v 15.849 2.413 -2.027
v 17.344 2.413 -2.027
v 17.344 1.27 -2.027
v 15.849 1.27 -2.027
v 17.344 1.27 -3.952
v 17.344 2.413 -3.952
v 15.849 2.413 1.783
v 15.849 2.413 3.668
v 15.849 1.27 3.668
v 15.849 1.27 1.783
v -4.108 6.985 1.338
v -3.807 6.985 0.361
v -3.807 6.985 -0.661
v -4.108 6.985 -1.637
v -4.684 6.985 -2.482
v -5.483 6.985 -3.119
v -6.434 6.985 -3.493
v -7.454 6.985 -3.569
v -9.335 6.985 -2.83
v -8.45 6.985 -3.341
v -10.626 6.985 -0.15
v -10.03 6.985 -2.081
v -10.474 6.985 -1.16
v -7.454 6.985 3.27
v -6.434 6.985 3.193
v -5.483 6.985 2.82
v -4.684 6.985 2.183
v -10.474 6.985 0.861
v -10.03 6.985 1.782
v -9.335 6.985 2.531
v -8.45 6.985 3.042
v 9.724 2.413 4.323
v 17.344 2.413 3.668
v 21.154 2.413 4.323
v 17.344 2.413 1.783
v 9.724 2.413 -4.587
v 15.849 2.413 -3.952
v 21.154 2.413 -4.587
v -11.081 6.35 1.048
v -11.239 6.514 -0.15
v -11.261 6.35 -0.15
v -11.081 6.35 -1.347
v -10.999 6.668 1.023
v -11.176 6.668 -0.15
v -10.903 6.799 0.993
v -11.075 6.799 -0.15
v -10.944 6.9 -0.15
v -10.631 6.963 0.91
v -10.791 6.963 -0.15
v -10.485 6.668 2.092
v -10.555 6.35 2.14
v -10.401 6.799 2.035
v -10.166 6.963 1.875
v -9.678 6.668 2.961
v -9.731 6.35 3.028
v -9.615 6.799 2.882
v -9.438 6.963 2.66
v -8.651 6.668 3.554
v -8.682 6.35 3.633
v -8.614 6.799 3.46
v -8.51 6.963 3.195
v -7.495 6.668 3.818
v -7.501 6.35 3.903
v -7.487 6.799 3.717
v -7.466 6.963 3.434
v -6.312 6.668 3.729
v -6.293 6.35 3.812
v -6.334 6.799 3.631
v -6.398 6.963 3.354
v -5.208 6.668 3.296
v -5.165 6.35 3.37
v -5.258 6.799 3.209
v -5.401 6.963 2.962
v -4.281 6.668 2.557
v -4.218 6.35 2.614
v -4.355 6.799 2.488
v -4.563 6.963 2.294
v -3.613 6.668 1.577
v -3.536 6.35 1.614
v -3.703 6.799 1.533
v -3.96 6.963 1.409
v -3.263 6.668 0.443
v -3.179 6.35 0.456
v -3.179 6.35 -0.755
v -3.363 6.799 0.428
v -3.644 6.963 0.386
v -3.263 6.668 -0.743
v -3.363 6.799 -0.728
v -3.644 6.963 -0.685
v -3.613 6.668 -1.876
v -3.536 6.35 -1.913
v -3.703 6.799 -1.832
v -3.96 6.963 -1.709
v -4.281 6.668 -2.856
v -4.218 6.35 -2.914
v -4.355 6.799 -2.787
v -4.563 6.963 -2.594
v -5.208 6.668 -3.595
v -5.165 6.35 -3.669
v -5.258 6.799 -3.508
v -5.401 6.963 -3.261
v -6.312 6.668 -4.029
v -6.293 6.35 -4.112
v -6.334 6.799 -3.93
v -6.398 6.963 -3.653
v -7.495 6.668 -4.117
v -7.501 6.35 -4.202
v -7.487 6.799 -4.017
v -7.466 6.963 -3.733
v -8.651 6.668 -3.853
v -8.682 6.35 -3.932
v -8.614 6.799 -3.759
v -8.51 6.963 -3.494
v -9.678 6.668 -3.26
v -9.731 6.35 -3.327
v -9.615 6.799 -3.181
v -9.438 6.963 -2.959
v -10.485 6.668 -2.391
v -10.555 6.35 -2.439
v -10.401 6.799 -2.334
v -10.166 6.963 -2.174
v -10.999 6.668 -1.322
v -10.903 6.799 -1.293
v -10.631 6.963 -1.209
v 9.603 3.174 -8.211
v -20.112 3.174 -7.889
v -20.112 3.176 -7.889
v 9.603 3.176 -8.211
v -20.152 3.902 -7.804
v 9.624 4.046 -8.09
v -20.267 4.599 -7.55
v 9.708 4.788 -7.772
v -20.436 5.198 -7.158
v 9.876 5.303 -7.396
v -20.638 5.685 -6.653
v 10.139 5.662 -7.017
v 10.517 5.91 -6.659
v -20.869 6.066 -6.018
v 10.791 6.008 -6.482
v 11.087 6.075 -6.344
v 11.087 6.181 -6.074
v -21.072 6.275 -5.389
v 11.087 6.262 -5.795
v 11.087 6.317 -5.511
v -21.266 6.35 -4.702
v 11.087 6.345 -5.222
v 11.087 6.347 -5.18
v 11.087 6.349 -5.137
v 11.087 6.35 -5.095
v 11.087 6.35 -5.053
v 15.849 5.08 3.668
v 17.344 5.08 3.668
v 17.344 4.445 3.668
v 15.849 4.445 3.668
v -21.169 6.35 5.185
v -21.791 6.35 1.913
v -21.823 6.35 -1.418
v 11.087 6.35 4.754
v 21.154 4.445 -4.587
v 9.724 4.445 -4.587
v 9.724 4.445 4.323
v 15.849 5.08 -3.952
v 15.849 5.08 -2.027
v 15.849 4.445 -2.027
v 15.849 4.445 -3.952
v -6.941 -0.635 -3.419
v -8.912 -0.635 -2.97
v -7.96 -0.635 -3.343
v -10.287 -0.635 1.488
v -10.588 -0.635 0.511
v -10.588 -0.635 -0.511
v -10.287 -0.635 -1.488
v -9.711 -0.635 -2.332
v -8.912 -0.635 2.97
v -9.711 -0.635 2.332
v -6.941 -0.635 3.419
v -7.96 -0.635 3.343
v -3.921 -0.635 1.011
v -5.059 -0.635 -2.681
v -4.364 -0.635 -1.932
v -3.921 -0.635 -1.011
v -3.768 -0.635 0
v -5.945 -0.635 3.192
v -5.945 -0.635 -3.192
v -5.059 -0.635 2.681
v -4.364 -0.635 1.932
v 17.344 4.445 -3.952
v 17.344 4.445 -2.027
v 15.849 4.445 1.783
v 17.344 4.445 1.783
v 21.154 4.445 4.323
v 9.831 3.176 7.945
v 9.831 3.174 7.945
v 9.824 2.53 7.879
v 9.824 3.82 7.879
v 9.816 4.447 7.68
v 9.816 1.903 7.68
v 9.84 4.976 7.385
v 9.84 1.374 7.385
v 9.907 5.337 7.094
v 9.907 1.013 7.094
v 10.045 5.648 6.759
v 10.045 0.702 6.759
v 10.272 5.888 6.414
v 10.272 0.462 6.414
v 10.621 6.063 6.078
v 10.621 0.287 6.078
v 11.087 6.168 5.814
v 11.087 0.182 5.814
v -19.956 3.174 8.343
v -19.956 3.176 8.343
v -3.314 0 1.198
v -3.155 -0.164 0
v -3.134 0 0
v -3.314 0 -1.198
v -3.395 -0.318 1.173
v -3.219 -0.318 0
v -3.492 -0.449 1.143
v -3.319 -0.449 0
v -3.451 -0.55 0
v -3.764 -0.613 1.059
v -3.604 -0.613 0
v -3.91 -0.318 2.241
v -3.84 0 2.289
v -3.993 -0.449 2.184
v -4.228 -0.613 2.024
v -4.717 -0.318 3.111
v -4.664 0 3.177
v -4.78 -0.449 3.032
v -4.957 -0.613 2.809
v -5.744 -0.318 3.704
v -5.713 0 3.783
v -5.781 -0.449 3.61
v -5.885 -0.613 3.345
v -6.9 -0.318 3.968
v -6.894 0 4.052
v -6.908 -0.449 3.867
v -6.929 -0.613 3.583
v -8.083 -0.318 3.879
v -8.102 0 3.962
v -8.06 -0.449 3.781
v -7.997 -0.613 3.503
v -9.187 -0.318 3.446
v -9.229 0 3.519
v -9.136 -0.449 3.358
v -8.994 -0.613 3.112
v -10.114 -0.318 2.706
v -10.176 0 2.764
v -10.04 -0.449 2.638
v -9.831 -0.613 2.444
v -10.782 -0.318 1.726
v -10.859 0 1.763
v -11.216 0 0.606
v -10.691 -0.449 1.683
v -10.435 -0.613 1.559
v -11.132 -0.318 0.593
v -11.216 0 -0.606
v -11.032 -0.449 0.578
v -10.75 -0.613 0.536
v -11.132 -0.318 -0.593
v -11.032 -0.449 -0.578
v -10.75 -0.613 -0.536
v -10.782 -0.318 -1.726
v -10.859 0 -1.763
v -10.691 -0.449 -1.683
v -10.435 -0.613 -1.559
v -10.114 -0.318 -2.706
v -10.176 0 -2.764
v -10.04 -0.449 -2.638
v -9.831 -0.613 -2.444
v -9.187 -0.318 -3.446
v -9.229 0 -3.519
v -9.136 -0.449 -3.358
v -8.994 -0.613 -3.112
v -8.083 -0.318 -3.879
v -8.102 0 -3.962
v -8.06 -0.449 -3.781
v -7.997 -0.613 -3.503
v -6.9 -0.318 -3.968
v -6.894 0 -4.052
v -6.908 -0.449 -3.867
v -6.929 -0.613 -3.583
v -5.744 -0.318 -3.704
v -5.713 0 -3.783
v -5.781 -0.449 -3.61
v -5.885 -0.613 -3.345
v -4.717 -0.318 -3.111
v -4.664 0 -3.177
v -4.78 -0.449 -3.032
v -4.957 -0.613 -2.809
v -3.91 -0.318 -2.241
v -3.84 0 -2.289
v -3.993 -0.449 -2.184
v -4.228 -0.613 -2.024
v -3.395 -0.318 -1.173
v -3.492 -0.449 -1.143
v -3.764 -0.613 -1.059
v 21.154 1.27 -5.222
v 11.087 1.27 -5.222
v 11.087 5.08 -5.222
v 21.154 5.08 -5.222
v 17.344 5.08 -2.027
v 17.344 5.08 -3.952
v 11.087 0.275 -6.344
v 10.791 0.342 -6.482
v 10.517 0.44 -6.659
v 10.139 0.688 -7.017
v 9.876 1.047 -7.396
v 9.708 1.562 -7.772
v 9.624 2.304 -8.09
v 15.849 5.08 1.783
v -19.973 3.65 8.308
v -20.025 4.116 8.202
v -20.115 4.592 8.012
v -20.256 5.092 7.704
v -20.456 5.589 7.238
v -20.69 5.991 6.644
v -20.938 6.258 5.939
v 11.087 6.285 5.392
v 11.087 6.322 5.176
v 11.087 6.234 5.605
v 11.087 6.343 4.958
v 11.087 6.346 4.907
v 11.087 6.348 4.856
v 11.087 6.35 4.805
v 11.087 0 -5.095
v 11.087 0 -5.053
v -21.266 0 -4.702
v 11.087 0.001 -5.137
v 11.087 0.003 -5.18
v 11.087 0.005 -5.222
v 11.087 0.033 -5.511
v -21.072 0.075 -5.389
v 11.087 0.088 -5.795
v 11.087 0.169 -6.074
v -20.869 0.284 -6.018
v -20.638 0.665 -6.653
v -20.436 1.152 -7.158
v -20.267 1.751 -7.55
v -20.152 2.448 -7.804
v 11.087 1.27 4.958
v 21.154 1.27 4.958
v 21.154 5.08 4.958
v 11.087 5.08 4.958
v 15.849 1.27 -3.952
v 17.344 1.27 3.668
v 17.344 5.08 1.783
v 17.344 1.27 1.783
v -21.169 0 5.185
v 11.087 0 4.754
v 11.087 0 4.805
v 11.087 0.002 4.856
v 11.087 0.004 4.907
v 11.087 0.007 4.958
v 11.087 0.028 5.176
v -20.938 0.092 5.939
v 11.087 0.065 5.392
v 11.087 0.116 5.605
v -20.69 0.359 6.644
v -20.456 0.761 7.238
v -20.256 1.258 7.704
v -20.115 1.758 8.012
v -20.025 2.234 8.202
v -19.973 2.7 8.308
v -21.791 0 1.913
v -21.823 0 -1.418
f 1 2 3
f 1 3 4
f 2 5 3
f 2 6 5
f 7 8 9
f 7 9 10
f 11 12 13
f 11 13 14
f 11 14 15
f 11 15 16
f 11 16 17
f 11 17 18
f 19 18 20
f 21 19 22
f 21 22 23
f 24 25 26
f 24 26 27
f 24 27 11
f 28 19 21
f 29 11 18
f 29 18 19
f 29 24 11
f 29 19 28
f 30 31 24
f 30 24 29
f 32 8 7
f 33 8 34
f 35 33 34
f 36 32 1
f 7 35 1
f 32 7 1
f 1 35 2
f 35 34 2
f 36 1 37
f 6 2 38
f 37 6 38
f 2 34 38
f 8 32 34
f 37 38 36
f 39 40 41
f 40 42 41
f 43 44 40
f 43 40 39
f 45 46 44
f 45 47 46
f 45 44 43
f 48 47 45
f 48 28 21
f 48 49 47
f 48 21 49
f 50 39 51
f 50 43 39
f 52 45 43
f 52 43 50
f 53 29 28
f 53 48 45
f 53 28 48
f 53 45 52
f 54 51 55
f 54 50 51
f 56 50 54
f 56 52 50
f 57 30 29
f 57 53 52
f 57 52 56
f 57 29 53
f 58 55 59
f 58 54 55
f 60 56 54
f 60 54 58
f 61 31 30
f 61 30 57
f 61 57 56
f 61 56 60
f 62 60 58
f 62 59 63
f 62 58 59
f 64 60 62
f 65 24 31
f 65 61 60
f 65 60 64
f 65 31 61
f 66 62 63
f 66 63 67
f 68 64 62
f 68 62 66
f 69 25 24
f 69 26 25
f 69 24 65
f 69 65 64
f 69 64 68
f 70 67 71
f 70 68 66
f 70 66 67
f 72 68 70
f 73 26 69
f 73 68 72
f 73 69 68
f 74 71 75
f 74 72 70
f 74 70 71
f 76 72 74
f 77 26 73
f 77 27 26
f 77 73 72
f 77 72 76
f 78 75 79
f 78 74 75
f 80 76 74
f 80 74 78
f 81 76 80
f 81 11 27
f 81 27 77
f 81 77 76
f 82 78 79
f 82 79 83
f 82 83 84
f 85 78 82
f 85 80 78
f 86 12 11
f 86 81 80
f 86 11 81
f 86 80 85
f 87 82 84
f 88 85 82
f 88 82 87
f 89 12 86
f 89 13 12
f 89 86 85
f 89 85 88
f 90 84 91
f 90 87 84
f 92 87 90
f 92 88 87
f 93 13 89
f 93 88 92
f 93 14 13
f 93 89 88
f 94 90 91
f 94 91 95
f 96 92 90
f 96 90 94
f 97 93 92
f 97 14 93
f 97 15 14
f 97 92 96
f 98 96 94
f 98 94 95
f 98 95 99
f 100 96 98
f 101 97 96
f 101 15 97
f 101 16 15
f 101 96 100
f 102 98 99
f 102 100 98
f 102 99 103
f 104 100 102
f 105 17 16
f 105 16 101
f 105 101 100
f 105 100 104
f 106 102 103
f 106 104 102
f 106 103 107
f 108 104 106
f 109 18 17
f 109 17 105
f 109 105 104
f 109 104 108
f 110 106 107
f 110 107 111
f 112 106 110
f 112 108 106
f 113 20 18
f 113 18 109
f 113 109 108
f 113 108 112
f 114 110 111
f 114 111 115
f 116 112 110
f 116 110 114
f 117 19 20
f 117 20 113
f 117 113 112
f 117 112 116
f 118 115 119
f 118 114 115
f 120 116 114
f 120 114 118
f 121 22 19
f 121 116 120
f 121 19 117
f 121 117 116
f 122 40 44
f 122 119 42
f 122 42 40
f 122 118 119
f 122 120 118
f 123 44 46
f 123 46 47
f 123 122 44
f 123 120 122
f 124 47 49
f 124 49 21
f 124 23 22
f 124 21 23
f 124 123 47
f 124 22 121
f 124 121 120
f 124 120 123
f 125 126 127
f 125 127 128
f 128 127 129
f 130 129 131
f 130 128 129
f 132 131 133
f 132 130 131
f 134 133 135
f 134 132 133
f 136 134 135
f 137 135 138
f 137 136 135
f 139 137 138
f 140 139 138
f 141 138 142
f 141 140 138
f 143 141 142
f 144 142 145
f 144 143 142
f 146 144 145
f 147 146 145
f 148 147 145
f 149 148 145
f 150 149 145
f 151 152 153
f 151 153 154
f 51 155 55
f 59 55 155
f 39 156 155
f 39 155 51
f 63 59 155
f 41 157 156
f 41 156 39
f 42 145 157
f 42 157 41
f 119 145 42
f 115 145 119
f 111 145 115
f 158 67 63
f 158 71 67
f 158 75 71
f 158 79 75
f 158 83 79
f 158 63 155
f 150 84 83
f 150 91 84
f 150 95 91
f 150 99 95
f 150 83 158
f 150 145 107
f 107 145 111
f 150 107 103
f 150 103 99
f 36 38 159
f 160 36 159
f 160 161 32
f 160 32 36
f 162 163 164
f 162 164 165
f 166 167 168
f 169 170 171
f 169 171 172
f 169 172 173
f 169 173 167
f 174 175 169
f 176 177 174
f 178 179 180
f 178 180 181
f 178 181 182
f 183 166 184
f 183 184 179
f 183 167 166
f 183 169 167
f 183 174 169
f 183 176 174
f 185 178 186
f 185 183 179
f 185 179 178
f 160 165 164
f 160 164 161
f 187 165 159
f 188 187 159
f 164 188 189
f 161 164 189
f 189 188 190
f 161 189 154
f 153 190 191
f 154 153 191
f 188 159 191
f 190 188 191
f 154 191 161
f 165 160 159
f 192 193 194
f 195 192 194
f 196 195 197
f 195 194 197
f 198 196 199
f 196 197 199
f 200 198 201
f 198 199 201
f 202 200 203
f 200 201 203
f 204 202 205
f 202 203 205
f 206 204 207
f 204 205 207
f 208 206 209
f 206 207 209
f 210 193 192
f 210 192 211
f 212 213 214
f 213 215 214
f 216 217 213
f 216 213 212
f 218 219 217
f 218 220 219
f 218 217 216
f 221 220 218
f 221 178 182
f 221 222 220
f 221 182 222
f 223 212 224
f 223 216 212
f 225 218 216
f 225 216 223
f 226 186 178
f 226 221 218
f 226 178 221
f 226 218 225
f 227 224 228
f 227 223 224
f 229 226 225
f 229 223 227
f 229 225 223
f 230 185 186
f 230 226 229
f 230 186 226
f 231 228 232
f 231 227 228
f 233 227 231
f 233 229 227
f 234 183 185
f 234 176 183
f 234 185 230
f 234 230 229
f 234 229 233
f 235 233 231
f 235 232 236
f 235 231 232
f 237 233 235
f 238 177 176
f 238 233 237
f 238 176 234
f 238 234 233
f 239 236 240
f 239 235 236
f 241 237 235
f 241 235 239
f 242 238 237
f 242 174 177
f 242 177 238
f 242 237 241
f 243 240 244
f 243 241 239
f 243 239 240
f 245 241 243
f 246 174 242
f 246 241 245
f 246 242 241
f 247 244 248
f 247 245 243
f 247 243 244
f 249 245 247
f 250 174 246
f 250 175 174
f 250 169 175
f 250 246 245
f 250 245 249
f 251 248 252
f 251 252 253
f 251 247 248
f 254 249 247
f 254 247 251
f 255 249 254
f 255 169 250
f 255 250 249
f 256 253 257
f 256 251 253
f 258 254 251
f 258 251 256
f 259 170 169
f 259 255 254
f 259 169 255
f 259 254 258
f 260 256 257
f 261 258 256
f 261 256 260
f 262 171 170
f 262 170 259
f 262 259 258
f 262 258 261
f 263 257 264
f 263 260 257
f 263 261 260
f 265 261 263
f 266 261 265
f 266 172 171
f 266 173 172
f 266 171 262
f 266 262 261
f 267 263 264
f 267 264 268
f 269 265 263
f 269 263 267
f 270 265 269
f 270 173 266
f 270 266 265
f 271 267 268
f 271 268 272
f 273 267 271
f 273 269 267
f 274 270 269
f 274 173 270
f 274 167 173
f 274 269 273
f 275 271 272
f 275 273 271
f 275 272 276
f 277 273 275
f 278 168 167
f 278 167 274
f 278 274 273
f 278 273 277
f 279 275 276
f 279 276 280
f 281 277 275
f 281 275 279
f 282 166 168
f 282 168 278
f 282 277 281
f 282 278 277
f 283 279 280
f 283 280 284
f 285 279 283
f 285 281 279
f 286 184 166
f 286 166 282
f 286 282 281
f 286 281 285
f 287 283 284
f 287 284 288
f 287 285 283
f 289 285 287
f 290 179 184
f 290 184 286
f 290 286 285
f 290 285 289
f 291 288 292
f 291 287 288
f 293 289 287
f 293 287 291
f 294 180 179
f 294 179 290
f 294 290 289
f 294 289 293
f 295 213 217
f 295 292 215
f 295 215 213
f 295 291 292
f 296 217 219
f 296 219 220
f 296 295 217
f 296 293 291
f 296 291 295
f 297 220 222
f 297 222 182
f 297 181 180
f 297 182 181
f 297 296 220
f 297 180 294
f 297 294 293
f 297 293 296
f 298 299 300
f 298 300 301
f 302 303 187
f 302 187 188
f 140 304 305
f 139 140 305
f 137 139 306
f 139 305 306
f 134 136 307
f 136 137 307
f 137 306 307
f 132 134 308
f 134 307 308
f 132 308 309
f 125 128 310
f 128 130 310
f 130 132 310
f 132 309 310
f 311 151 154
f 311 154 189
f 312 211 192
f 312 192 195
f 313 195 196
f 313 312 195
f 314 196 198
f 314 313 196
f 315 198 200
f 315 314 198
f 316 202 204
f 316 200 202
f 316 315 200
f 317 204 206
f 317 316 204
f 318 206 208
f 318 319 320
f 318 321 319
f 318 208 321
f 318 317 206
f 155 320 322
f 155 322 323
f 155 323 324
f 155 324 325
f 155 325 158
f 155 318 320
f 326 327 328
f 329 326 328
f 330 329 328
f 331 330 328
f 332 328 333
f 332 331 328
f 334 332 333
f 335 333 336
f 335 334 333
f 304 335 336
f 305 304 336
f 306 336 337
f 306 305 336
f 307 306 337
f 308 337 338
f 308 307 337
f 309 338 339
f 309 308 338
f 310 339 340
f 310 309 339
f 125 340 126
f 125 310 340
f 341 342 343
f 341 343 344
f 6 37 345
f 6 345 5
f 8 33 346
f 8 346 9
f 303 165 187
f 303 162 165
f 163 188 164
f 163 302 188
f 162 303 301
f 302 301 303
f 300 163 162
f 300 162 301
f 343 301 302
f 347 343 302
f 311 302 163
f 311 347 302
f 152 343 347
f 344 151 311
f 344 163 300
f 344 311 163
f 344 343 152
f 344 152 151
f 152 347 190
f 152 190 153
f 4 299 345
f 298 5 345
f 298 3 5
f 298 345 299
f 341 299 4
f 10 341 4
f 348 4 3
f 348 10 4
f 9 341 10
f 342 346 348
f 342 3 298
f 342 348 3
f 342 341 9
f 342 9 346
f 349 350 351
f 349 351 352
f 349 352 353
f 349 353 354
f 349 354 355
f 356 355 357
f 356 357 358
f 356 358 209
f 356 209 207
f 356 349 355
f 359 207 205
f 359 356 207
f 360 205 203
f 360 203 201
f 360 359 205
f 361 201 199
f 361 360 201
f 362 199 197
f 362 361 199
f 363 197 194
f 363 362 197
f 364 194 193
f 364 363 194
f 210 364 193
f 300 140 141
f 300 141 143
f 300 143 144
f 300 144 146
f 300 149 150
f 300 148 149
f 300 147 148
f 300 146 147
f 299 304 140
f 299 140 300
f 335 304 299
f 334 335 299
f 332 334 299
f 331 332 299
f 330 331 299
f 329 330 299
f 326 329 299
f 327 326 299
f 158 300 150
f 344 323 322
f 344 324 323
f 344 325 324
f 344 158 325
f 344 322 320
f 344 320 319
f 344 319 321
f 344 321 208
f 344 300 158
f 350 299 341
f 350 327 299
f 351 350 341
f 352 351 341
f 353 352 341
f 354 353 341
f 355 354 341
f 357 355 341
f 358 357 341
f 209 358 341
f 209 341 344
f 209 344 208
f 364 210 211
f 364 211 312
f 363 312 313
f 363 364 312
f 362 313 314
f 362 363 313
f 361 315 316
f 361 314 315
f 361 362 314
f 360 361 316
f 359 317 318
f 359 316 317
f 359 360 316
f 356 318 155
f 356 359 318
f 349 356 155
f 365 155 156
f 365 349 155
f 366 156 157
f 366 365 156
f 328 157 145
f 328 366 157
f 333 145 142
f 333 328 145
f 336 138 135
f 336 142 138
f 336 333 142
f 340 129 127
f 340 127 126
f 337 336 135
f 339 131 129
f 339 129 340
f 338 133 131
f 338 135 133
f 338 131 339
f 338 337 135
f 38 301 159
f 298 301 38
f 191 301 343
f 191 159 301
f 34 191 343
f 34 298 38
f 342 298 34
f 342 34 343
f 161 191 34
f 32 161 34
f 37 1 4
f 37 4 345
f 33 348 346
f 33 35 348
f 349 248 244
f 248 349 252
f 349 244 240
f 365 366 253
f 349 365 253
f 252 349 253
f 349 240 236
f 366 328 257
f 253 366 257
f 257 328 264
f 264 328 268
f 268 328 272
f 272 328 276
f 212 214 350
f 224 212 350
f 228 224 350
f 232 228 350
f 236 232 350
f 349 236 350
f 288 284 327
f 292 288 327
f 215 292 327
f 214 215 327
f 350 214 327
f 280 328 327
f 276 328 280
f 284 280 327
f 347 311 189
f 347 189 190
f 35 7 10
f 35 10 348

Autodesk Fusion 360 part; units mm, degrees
sketch "MASTER SKETCH" plane through (0, 0, 0) normal (0, 1, 0) x (1, 0, 0)
  line L0 (-20.1125, 7.8888) -> (9.6034, 8.2112)
  arc A0 (9.6034, 8.2112) -> (11.0867, 6.3443) centre (11.9278, 8.5352) ccw
  line L1 (11.0867, 6.3443) -> (11.0867, 5.2219)
  line L2 (11.0867, 5.2219) -> (21.1539, 5.2219)
  line L3 (21.1539, 5.2219) -> (21.1539, -4.9577)
  line L4 (21.1539, -4.9577) -> (11.0867, -4.9577)
  line L5 (11.0867, -4.9577) -> (11.0867, -5.8142)
  arc A1 (11.0867, -5.8142) -> (9.8311, -7.945) centre (11.8441, -7.6959) ccw
  line L6 (9.8311, -7.945) -> (-19.9558, -8.3433)
  arc A2 (-20.1125, 7.8888) -> (-19.9558, -8.3433) centre (-3.1266, -0.064) ccw
  line L7 (15.1779, 3.7868) -> (16.7624, 3.7868)
  line L8 (16.7624, 3.7868) -> (16.7624, 1.8338)
  line L9 (16.7624, 1.8338) -> (15.1779, 1.8338)
  line L10 (15.1779, 1.8338) -> (15.1779, 3.7868)
  line L11 (15.1779, -1.2246) -> (16.7624, -1.2246)
  line L12 (16.7624, -1.2246) -> (16.7624, -3.2144)
  line L13 (16.7624, -3.2144) -> (15.1779, -3.2144)
  line L14 (15.1779, -3.2144) -> (15.1779, -1.2246)
  circle A3 centre (-7.2793, 0.4193) radius 4.0763
extrude "Extrude1" add sketch "MASTER SKETCH" along normal blind 6.35 contours L0 A0 L1 L2 L3 L4 L5 A1 L6 A2 | L7 L8 L9 L10 | L11 L12 L13 L14 | A3 in component "BODY"
fillet "Fillet1" radius 3.175 4 edges at (-5.0623, 6.35, 8.1442) (-5.2545, 6.35, -8.05) (-5.0623, 0, 8.1442) (-5.2545, 0, -8.05) in component "BODY"
sketch "Sketch1" plane through (0, 6.35, 0) normal (0, 1, 0) x (-1, 0, 0) in component "BODY"
  line L0 (-21.1539, -5.1613) -> (21.2666, -4.7011)
  arc A0 (21.2666, -4.7011) -> (21.1696, 5.1842) centre (3.1266, 0.064) ccw
  line L1 (21.1696, 5.1842) -> (-21.1539, 4.6184)
  line L2 (-21.1539, 4.6184) -> (-21.1539, -5.1613)
  line L3 (-11.0867, -6.3443) -> (-11.0867, 5.8142)
  line L4 (-11.0867, 5.8142) -> (-21.1539, 5.8142)
  line L5 (-21.1539, 5.8142) -> (-21.1539, -6.3443)
  line L6 (-21.1539, -6.3443) -> (-11.0867, -6.3443)
extrude "Extrude2" cut sketch "Sketch1" against normal blind 1.27 contours L0 L1 L2 L3 L5 | L0 L3 L5 L6 | L1 L3 L4 L5 in component "BODY"
sketch "Sketch2" plane through (0, 0, 0) normal (0, -1, 0) x (1, 0, 0) in component "BODY"
  line L0 (-21.2666, -4.7011) -> (21.1539, -5.1613)
  line L1 (21.1539, -5.1613) -> (21.1539, 4.6184)
  line L2 (21.1539, 4.6184) -> (-21.1696, 5.1842)
  arc A0 (-21.1696, 5.1842) -> (-21.2666, -4.7011) centre (-3.1266, 0.064) ccw
  line L3 (11.0867, 5.8142) -> (11.0867, -6.3443)
  line L4 (11.0867, -6.3443) -> (21.1539, -6.3443)
  line L5 (21.1539, -6.3443) -> (21.1539, 5.8142)
  line L6 (21.1539, 5.8142) -> (11.0867, 5.8142)
extrude "Extrude3" cut sketch "Sketch2" against normal blind 1.27 contours L0 L1 L2 L3 L5 | L0 L3 L4 L5 | L2 L3 L5 L6 in component "BODY"
sketch "Sketch3" plane through (0, 5.08, 0) normal (0, 1, 0) x (-1, 0, 0) in component "BODY"
  line L0 (-21.1539, -5.2219) -> (-11.0867, -5.2219)
  line L1 (-11.0867, -5.2219) -> (-11.0867, 4.9577)
  line L2 (-11.0867, 4.9577) -> (-21.1539, 4.9577)
  line L3 (-21.1539, 4.9577) -> (-21.1539, -5.2219)
  line L4 (-15.8492, -3.9519) -> (-17.3439, -3.9519)
  line L5 (-17.3439, -3.9519) -> (-17.3439, -2.0273)
  line L6 (-17.3439, -2.0273) -> (-15.8492, -2.0273)
  line L7 (-15.8492, -2.0273) -> (-15.8492, -3.9519)
  line L8 (-15.8492, 1.7827) -> (-17.3439, 1.7827)
  line L9 (-17.3439, 1.7827) -> (-17.3439, 3.6681)
  line L10 (-17.3439, 3.6681) -> (-15.8492, 3.6681)
  line L11 (-15.8492, 3.6681) -> (-15.8492, 1.7827)
  dimension "d8" = 3.81
  dimension "d9" = 7.62
  dimension "d10" = 4.7625
  dimension "d11" = 4.7625
  dimension "d12" = 3.81
  dimension "d13" = 3.81
  dimension "d14" = 3.81
  dimension "d15" = 1.27
  dimension "d16" = 6.985
sketch "Sketch4" plane through (21.1539, 0, 0) normal (1, 0, 0) x (0, 0, -1) in component "BODY"
  line L0 (-4.9577, 1.27) -> (5.2219, 1.27)
  line L1 (5.2219, 1.27) -> (5.2219, 5.08)
  line L2 (5.2219, 5.08) -> (-4.9577, 5.08)
  line L3 (-4.9577, 5.08) -> (-4.9577, 1.27)
  line L4 (-4.9577, 5.08) -> (-4.9577, 4.445)
  line L5 (-4.9577, 4.445) -> (-4.3227, 4.445)
  line L6 (5.2219, 5.08) -> (5.2219, 4.445)
  line L7 (5.2219, 4.445) -> (4.5869, 4.445)
  line L8 (4.5869, 4.445) -> (-4.3227, 4.445)
  line L9 (-4.3227, 4.445) -> (-4.3227, 2.413)
  line L10 (-4.3227, 2.413) -> (4.5869, 2.413)
  line L11 (4.5869, 2.413) -> (4.5869, 4.445)
  dimension "d17" = 0.635
  dimension "d18" = 0.635
  dimension "d19" = 0.635
  dimension "d20" = 0.635
  dimension "d21" = 2.032
extrude "Extrude4" cut sketch "Sketch4" against normal blind 11.43 contours L8 L9 L10 L11 in component "BODY"
sketch "Sketch5" plane through (0, 2.413, 0) normal (0, 1, 0) x (-1, 0, 0) in component "BODY"
extrude "Extrude5" cut sketch "Sketch3" against normal blind 1.778 contours L4 L5 L6 L7 | L8 L9 L10 L11 in component "BODY"
sketch "Sketch6" plane through (0, 6.35, 0) normal (0, 1, 0) x (-1, 0, 0) in component "BODY"
  line L0 (-11.0867, 4.753) -> (-11.0867, -5.0521)
  line L1 (-11.0867, -5.0521) -> (21.2666, -4.7011)
  arc A0 (21.2666, -4.7011) -> (21.1696, 5.1842) centre (3.1266, 0.064) ccw
  line L2 (21.1696, 5.1842) -> (-11.0867, 4.753)
  circle A1 centre (7.1973, -0.1496) radius 4.0638
extrude "Extrude6" add sketch "Sketch6" along normal blind 0.635 contours A1 in component "BODY"
sketch "Sketch7" plane through (0, 0, 0) normal (0, -1, 0) x (1, 0, 0) in component "BODY"
  line L0 (11.0867, -5.0521) -> (11.0867, 4.753)
  line L1 (11.0867, 4.753) -> (-21.1696, 5.1842)
  arc A0 (-21.1696, 5.1842) -> (-21.2666, -4.7011) centre (-3.1266, 0.064) ccw
  line L2 (-21.2666, -4.7011) -> (11.0867, -5.0521)
  circle A1 centre (-7.1973, 0) radius 4.0638
extrude "Extrude7" add sketch "Sketch7" along normal blind 0.635 contours A1 in component "BODY"
fillet "Fillet2" radius 0.635 2 edges at (-10.9861, -0.635, -1.4695) (-3.4085, 6.985, -1.6191) 1 faces at (-8.4257, -0.635, 1.6844) in component "BODY"
sketch "Sketch8" plane through (0, 5.08, 0) normal (0, 1, 0) x (-1, 0, 0) in component "BODY"
  line L0 (-17.3439, -3.9519) -> (-17.3439, -2.0273)
  line L1 (-17.3439, -2.0273) -> (-15.8492, -2.0273)
  line L2 (-15.8492, -2.0273) -> (-15.8492, -3.9519)
  line L3 (-15.8492, -3.9519) -> (-17.3439, -3.9519)
  line L4 (-17.3439, 1.7827) -> (-17.3439, 3.6681)
  line L5 (-17.3439, 3.6681) -> (-15.8492, 3.6681)
  line L6 (-15.8492, 3.6681) -> (-15.8492, 1.7827)
  line L7 (-15.8492, 1.7827) -> (-17.3439, 1.7827)
  line L8 (-21.1539, -5.2219) -> (-11.0867, -5.2219)
  line L9 (-11.0867, -5.2219) -> (-11.0867, 4.9577)
  line L10 (-11.0867, 4.9577) -> (-21.1539, 4.9577)
  line L11 (-21.1539, 4.9577) -> (-21.1539, -5.2219)
  line L12 (-15.8492, -3.9519) -> (-17.3439, -3.9519)
  line L13 (-17.3439, -3.9519) -> (-17.3439, -2.0273)
  line L14 (-17.3439, -2.0273) -> (-15.8492, -2.0273)
  line L15 (-15.8492, -2.0273) -> (-15.8492, -3.9519)
  line L16 (-15.8492, 1.7827) -> (-17.3439, 1.7827)
  line L17 (-17.3439, 1.7827) -> (-17.3439, 3.6681)
  line L18 (-17.3439, 3.6681) -> (-15.8492, 3.6681)
  line L19 (-15.8492, 3.6681) -> (-15.8492, 1.7827)
extrude "Extrude8" cut sketch "Sketch8" against normal blind 5.842 contours L0 L1 L2 L3 L12 L13 L14 L15 | L4 L5 L6 L7 L16 L17 L18 L19 in component "BODY"
component "BODY" placed x (1, 0, 0) y (0, 1, 0) z (0, 0, 1) at (0, 0, 0)
